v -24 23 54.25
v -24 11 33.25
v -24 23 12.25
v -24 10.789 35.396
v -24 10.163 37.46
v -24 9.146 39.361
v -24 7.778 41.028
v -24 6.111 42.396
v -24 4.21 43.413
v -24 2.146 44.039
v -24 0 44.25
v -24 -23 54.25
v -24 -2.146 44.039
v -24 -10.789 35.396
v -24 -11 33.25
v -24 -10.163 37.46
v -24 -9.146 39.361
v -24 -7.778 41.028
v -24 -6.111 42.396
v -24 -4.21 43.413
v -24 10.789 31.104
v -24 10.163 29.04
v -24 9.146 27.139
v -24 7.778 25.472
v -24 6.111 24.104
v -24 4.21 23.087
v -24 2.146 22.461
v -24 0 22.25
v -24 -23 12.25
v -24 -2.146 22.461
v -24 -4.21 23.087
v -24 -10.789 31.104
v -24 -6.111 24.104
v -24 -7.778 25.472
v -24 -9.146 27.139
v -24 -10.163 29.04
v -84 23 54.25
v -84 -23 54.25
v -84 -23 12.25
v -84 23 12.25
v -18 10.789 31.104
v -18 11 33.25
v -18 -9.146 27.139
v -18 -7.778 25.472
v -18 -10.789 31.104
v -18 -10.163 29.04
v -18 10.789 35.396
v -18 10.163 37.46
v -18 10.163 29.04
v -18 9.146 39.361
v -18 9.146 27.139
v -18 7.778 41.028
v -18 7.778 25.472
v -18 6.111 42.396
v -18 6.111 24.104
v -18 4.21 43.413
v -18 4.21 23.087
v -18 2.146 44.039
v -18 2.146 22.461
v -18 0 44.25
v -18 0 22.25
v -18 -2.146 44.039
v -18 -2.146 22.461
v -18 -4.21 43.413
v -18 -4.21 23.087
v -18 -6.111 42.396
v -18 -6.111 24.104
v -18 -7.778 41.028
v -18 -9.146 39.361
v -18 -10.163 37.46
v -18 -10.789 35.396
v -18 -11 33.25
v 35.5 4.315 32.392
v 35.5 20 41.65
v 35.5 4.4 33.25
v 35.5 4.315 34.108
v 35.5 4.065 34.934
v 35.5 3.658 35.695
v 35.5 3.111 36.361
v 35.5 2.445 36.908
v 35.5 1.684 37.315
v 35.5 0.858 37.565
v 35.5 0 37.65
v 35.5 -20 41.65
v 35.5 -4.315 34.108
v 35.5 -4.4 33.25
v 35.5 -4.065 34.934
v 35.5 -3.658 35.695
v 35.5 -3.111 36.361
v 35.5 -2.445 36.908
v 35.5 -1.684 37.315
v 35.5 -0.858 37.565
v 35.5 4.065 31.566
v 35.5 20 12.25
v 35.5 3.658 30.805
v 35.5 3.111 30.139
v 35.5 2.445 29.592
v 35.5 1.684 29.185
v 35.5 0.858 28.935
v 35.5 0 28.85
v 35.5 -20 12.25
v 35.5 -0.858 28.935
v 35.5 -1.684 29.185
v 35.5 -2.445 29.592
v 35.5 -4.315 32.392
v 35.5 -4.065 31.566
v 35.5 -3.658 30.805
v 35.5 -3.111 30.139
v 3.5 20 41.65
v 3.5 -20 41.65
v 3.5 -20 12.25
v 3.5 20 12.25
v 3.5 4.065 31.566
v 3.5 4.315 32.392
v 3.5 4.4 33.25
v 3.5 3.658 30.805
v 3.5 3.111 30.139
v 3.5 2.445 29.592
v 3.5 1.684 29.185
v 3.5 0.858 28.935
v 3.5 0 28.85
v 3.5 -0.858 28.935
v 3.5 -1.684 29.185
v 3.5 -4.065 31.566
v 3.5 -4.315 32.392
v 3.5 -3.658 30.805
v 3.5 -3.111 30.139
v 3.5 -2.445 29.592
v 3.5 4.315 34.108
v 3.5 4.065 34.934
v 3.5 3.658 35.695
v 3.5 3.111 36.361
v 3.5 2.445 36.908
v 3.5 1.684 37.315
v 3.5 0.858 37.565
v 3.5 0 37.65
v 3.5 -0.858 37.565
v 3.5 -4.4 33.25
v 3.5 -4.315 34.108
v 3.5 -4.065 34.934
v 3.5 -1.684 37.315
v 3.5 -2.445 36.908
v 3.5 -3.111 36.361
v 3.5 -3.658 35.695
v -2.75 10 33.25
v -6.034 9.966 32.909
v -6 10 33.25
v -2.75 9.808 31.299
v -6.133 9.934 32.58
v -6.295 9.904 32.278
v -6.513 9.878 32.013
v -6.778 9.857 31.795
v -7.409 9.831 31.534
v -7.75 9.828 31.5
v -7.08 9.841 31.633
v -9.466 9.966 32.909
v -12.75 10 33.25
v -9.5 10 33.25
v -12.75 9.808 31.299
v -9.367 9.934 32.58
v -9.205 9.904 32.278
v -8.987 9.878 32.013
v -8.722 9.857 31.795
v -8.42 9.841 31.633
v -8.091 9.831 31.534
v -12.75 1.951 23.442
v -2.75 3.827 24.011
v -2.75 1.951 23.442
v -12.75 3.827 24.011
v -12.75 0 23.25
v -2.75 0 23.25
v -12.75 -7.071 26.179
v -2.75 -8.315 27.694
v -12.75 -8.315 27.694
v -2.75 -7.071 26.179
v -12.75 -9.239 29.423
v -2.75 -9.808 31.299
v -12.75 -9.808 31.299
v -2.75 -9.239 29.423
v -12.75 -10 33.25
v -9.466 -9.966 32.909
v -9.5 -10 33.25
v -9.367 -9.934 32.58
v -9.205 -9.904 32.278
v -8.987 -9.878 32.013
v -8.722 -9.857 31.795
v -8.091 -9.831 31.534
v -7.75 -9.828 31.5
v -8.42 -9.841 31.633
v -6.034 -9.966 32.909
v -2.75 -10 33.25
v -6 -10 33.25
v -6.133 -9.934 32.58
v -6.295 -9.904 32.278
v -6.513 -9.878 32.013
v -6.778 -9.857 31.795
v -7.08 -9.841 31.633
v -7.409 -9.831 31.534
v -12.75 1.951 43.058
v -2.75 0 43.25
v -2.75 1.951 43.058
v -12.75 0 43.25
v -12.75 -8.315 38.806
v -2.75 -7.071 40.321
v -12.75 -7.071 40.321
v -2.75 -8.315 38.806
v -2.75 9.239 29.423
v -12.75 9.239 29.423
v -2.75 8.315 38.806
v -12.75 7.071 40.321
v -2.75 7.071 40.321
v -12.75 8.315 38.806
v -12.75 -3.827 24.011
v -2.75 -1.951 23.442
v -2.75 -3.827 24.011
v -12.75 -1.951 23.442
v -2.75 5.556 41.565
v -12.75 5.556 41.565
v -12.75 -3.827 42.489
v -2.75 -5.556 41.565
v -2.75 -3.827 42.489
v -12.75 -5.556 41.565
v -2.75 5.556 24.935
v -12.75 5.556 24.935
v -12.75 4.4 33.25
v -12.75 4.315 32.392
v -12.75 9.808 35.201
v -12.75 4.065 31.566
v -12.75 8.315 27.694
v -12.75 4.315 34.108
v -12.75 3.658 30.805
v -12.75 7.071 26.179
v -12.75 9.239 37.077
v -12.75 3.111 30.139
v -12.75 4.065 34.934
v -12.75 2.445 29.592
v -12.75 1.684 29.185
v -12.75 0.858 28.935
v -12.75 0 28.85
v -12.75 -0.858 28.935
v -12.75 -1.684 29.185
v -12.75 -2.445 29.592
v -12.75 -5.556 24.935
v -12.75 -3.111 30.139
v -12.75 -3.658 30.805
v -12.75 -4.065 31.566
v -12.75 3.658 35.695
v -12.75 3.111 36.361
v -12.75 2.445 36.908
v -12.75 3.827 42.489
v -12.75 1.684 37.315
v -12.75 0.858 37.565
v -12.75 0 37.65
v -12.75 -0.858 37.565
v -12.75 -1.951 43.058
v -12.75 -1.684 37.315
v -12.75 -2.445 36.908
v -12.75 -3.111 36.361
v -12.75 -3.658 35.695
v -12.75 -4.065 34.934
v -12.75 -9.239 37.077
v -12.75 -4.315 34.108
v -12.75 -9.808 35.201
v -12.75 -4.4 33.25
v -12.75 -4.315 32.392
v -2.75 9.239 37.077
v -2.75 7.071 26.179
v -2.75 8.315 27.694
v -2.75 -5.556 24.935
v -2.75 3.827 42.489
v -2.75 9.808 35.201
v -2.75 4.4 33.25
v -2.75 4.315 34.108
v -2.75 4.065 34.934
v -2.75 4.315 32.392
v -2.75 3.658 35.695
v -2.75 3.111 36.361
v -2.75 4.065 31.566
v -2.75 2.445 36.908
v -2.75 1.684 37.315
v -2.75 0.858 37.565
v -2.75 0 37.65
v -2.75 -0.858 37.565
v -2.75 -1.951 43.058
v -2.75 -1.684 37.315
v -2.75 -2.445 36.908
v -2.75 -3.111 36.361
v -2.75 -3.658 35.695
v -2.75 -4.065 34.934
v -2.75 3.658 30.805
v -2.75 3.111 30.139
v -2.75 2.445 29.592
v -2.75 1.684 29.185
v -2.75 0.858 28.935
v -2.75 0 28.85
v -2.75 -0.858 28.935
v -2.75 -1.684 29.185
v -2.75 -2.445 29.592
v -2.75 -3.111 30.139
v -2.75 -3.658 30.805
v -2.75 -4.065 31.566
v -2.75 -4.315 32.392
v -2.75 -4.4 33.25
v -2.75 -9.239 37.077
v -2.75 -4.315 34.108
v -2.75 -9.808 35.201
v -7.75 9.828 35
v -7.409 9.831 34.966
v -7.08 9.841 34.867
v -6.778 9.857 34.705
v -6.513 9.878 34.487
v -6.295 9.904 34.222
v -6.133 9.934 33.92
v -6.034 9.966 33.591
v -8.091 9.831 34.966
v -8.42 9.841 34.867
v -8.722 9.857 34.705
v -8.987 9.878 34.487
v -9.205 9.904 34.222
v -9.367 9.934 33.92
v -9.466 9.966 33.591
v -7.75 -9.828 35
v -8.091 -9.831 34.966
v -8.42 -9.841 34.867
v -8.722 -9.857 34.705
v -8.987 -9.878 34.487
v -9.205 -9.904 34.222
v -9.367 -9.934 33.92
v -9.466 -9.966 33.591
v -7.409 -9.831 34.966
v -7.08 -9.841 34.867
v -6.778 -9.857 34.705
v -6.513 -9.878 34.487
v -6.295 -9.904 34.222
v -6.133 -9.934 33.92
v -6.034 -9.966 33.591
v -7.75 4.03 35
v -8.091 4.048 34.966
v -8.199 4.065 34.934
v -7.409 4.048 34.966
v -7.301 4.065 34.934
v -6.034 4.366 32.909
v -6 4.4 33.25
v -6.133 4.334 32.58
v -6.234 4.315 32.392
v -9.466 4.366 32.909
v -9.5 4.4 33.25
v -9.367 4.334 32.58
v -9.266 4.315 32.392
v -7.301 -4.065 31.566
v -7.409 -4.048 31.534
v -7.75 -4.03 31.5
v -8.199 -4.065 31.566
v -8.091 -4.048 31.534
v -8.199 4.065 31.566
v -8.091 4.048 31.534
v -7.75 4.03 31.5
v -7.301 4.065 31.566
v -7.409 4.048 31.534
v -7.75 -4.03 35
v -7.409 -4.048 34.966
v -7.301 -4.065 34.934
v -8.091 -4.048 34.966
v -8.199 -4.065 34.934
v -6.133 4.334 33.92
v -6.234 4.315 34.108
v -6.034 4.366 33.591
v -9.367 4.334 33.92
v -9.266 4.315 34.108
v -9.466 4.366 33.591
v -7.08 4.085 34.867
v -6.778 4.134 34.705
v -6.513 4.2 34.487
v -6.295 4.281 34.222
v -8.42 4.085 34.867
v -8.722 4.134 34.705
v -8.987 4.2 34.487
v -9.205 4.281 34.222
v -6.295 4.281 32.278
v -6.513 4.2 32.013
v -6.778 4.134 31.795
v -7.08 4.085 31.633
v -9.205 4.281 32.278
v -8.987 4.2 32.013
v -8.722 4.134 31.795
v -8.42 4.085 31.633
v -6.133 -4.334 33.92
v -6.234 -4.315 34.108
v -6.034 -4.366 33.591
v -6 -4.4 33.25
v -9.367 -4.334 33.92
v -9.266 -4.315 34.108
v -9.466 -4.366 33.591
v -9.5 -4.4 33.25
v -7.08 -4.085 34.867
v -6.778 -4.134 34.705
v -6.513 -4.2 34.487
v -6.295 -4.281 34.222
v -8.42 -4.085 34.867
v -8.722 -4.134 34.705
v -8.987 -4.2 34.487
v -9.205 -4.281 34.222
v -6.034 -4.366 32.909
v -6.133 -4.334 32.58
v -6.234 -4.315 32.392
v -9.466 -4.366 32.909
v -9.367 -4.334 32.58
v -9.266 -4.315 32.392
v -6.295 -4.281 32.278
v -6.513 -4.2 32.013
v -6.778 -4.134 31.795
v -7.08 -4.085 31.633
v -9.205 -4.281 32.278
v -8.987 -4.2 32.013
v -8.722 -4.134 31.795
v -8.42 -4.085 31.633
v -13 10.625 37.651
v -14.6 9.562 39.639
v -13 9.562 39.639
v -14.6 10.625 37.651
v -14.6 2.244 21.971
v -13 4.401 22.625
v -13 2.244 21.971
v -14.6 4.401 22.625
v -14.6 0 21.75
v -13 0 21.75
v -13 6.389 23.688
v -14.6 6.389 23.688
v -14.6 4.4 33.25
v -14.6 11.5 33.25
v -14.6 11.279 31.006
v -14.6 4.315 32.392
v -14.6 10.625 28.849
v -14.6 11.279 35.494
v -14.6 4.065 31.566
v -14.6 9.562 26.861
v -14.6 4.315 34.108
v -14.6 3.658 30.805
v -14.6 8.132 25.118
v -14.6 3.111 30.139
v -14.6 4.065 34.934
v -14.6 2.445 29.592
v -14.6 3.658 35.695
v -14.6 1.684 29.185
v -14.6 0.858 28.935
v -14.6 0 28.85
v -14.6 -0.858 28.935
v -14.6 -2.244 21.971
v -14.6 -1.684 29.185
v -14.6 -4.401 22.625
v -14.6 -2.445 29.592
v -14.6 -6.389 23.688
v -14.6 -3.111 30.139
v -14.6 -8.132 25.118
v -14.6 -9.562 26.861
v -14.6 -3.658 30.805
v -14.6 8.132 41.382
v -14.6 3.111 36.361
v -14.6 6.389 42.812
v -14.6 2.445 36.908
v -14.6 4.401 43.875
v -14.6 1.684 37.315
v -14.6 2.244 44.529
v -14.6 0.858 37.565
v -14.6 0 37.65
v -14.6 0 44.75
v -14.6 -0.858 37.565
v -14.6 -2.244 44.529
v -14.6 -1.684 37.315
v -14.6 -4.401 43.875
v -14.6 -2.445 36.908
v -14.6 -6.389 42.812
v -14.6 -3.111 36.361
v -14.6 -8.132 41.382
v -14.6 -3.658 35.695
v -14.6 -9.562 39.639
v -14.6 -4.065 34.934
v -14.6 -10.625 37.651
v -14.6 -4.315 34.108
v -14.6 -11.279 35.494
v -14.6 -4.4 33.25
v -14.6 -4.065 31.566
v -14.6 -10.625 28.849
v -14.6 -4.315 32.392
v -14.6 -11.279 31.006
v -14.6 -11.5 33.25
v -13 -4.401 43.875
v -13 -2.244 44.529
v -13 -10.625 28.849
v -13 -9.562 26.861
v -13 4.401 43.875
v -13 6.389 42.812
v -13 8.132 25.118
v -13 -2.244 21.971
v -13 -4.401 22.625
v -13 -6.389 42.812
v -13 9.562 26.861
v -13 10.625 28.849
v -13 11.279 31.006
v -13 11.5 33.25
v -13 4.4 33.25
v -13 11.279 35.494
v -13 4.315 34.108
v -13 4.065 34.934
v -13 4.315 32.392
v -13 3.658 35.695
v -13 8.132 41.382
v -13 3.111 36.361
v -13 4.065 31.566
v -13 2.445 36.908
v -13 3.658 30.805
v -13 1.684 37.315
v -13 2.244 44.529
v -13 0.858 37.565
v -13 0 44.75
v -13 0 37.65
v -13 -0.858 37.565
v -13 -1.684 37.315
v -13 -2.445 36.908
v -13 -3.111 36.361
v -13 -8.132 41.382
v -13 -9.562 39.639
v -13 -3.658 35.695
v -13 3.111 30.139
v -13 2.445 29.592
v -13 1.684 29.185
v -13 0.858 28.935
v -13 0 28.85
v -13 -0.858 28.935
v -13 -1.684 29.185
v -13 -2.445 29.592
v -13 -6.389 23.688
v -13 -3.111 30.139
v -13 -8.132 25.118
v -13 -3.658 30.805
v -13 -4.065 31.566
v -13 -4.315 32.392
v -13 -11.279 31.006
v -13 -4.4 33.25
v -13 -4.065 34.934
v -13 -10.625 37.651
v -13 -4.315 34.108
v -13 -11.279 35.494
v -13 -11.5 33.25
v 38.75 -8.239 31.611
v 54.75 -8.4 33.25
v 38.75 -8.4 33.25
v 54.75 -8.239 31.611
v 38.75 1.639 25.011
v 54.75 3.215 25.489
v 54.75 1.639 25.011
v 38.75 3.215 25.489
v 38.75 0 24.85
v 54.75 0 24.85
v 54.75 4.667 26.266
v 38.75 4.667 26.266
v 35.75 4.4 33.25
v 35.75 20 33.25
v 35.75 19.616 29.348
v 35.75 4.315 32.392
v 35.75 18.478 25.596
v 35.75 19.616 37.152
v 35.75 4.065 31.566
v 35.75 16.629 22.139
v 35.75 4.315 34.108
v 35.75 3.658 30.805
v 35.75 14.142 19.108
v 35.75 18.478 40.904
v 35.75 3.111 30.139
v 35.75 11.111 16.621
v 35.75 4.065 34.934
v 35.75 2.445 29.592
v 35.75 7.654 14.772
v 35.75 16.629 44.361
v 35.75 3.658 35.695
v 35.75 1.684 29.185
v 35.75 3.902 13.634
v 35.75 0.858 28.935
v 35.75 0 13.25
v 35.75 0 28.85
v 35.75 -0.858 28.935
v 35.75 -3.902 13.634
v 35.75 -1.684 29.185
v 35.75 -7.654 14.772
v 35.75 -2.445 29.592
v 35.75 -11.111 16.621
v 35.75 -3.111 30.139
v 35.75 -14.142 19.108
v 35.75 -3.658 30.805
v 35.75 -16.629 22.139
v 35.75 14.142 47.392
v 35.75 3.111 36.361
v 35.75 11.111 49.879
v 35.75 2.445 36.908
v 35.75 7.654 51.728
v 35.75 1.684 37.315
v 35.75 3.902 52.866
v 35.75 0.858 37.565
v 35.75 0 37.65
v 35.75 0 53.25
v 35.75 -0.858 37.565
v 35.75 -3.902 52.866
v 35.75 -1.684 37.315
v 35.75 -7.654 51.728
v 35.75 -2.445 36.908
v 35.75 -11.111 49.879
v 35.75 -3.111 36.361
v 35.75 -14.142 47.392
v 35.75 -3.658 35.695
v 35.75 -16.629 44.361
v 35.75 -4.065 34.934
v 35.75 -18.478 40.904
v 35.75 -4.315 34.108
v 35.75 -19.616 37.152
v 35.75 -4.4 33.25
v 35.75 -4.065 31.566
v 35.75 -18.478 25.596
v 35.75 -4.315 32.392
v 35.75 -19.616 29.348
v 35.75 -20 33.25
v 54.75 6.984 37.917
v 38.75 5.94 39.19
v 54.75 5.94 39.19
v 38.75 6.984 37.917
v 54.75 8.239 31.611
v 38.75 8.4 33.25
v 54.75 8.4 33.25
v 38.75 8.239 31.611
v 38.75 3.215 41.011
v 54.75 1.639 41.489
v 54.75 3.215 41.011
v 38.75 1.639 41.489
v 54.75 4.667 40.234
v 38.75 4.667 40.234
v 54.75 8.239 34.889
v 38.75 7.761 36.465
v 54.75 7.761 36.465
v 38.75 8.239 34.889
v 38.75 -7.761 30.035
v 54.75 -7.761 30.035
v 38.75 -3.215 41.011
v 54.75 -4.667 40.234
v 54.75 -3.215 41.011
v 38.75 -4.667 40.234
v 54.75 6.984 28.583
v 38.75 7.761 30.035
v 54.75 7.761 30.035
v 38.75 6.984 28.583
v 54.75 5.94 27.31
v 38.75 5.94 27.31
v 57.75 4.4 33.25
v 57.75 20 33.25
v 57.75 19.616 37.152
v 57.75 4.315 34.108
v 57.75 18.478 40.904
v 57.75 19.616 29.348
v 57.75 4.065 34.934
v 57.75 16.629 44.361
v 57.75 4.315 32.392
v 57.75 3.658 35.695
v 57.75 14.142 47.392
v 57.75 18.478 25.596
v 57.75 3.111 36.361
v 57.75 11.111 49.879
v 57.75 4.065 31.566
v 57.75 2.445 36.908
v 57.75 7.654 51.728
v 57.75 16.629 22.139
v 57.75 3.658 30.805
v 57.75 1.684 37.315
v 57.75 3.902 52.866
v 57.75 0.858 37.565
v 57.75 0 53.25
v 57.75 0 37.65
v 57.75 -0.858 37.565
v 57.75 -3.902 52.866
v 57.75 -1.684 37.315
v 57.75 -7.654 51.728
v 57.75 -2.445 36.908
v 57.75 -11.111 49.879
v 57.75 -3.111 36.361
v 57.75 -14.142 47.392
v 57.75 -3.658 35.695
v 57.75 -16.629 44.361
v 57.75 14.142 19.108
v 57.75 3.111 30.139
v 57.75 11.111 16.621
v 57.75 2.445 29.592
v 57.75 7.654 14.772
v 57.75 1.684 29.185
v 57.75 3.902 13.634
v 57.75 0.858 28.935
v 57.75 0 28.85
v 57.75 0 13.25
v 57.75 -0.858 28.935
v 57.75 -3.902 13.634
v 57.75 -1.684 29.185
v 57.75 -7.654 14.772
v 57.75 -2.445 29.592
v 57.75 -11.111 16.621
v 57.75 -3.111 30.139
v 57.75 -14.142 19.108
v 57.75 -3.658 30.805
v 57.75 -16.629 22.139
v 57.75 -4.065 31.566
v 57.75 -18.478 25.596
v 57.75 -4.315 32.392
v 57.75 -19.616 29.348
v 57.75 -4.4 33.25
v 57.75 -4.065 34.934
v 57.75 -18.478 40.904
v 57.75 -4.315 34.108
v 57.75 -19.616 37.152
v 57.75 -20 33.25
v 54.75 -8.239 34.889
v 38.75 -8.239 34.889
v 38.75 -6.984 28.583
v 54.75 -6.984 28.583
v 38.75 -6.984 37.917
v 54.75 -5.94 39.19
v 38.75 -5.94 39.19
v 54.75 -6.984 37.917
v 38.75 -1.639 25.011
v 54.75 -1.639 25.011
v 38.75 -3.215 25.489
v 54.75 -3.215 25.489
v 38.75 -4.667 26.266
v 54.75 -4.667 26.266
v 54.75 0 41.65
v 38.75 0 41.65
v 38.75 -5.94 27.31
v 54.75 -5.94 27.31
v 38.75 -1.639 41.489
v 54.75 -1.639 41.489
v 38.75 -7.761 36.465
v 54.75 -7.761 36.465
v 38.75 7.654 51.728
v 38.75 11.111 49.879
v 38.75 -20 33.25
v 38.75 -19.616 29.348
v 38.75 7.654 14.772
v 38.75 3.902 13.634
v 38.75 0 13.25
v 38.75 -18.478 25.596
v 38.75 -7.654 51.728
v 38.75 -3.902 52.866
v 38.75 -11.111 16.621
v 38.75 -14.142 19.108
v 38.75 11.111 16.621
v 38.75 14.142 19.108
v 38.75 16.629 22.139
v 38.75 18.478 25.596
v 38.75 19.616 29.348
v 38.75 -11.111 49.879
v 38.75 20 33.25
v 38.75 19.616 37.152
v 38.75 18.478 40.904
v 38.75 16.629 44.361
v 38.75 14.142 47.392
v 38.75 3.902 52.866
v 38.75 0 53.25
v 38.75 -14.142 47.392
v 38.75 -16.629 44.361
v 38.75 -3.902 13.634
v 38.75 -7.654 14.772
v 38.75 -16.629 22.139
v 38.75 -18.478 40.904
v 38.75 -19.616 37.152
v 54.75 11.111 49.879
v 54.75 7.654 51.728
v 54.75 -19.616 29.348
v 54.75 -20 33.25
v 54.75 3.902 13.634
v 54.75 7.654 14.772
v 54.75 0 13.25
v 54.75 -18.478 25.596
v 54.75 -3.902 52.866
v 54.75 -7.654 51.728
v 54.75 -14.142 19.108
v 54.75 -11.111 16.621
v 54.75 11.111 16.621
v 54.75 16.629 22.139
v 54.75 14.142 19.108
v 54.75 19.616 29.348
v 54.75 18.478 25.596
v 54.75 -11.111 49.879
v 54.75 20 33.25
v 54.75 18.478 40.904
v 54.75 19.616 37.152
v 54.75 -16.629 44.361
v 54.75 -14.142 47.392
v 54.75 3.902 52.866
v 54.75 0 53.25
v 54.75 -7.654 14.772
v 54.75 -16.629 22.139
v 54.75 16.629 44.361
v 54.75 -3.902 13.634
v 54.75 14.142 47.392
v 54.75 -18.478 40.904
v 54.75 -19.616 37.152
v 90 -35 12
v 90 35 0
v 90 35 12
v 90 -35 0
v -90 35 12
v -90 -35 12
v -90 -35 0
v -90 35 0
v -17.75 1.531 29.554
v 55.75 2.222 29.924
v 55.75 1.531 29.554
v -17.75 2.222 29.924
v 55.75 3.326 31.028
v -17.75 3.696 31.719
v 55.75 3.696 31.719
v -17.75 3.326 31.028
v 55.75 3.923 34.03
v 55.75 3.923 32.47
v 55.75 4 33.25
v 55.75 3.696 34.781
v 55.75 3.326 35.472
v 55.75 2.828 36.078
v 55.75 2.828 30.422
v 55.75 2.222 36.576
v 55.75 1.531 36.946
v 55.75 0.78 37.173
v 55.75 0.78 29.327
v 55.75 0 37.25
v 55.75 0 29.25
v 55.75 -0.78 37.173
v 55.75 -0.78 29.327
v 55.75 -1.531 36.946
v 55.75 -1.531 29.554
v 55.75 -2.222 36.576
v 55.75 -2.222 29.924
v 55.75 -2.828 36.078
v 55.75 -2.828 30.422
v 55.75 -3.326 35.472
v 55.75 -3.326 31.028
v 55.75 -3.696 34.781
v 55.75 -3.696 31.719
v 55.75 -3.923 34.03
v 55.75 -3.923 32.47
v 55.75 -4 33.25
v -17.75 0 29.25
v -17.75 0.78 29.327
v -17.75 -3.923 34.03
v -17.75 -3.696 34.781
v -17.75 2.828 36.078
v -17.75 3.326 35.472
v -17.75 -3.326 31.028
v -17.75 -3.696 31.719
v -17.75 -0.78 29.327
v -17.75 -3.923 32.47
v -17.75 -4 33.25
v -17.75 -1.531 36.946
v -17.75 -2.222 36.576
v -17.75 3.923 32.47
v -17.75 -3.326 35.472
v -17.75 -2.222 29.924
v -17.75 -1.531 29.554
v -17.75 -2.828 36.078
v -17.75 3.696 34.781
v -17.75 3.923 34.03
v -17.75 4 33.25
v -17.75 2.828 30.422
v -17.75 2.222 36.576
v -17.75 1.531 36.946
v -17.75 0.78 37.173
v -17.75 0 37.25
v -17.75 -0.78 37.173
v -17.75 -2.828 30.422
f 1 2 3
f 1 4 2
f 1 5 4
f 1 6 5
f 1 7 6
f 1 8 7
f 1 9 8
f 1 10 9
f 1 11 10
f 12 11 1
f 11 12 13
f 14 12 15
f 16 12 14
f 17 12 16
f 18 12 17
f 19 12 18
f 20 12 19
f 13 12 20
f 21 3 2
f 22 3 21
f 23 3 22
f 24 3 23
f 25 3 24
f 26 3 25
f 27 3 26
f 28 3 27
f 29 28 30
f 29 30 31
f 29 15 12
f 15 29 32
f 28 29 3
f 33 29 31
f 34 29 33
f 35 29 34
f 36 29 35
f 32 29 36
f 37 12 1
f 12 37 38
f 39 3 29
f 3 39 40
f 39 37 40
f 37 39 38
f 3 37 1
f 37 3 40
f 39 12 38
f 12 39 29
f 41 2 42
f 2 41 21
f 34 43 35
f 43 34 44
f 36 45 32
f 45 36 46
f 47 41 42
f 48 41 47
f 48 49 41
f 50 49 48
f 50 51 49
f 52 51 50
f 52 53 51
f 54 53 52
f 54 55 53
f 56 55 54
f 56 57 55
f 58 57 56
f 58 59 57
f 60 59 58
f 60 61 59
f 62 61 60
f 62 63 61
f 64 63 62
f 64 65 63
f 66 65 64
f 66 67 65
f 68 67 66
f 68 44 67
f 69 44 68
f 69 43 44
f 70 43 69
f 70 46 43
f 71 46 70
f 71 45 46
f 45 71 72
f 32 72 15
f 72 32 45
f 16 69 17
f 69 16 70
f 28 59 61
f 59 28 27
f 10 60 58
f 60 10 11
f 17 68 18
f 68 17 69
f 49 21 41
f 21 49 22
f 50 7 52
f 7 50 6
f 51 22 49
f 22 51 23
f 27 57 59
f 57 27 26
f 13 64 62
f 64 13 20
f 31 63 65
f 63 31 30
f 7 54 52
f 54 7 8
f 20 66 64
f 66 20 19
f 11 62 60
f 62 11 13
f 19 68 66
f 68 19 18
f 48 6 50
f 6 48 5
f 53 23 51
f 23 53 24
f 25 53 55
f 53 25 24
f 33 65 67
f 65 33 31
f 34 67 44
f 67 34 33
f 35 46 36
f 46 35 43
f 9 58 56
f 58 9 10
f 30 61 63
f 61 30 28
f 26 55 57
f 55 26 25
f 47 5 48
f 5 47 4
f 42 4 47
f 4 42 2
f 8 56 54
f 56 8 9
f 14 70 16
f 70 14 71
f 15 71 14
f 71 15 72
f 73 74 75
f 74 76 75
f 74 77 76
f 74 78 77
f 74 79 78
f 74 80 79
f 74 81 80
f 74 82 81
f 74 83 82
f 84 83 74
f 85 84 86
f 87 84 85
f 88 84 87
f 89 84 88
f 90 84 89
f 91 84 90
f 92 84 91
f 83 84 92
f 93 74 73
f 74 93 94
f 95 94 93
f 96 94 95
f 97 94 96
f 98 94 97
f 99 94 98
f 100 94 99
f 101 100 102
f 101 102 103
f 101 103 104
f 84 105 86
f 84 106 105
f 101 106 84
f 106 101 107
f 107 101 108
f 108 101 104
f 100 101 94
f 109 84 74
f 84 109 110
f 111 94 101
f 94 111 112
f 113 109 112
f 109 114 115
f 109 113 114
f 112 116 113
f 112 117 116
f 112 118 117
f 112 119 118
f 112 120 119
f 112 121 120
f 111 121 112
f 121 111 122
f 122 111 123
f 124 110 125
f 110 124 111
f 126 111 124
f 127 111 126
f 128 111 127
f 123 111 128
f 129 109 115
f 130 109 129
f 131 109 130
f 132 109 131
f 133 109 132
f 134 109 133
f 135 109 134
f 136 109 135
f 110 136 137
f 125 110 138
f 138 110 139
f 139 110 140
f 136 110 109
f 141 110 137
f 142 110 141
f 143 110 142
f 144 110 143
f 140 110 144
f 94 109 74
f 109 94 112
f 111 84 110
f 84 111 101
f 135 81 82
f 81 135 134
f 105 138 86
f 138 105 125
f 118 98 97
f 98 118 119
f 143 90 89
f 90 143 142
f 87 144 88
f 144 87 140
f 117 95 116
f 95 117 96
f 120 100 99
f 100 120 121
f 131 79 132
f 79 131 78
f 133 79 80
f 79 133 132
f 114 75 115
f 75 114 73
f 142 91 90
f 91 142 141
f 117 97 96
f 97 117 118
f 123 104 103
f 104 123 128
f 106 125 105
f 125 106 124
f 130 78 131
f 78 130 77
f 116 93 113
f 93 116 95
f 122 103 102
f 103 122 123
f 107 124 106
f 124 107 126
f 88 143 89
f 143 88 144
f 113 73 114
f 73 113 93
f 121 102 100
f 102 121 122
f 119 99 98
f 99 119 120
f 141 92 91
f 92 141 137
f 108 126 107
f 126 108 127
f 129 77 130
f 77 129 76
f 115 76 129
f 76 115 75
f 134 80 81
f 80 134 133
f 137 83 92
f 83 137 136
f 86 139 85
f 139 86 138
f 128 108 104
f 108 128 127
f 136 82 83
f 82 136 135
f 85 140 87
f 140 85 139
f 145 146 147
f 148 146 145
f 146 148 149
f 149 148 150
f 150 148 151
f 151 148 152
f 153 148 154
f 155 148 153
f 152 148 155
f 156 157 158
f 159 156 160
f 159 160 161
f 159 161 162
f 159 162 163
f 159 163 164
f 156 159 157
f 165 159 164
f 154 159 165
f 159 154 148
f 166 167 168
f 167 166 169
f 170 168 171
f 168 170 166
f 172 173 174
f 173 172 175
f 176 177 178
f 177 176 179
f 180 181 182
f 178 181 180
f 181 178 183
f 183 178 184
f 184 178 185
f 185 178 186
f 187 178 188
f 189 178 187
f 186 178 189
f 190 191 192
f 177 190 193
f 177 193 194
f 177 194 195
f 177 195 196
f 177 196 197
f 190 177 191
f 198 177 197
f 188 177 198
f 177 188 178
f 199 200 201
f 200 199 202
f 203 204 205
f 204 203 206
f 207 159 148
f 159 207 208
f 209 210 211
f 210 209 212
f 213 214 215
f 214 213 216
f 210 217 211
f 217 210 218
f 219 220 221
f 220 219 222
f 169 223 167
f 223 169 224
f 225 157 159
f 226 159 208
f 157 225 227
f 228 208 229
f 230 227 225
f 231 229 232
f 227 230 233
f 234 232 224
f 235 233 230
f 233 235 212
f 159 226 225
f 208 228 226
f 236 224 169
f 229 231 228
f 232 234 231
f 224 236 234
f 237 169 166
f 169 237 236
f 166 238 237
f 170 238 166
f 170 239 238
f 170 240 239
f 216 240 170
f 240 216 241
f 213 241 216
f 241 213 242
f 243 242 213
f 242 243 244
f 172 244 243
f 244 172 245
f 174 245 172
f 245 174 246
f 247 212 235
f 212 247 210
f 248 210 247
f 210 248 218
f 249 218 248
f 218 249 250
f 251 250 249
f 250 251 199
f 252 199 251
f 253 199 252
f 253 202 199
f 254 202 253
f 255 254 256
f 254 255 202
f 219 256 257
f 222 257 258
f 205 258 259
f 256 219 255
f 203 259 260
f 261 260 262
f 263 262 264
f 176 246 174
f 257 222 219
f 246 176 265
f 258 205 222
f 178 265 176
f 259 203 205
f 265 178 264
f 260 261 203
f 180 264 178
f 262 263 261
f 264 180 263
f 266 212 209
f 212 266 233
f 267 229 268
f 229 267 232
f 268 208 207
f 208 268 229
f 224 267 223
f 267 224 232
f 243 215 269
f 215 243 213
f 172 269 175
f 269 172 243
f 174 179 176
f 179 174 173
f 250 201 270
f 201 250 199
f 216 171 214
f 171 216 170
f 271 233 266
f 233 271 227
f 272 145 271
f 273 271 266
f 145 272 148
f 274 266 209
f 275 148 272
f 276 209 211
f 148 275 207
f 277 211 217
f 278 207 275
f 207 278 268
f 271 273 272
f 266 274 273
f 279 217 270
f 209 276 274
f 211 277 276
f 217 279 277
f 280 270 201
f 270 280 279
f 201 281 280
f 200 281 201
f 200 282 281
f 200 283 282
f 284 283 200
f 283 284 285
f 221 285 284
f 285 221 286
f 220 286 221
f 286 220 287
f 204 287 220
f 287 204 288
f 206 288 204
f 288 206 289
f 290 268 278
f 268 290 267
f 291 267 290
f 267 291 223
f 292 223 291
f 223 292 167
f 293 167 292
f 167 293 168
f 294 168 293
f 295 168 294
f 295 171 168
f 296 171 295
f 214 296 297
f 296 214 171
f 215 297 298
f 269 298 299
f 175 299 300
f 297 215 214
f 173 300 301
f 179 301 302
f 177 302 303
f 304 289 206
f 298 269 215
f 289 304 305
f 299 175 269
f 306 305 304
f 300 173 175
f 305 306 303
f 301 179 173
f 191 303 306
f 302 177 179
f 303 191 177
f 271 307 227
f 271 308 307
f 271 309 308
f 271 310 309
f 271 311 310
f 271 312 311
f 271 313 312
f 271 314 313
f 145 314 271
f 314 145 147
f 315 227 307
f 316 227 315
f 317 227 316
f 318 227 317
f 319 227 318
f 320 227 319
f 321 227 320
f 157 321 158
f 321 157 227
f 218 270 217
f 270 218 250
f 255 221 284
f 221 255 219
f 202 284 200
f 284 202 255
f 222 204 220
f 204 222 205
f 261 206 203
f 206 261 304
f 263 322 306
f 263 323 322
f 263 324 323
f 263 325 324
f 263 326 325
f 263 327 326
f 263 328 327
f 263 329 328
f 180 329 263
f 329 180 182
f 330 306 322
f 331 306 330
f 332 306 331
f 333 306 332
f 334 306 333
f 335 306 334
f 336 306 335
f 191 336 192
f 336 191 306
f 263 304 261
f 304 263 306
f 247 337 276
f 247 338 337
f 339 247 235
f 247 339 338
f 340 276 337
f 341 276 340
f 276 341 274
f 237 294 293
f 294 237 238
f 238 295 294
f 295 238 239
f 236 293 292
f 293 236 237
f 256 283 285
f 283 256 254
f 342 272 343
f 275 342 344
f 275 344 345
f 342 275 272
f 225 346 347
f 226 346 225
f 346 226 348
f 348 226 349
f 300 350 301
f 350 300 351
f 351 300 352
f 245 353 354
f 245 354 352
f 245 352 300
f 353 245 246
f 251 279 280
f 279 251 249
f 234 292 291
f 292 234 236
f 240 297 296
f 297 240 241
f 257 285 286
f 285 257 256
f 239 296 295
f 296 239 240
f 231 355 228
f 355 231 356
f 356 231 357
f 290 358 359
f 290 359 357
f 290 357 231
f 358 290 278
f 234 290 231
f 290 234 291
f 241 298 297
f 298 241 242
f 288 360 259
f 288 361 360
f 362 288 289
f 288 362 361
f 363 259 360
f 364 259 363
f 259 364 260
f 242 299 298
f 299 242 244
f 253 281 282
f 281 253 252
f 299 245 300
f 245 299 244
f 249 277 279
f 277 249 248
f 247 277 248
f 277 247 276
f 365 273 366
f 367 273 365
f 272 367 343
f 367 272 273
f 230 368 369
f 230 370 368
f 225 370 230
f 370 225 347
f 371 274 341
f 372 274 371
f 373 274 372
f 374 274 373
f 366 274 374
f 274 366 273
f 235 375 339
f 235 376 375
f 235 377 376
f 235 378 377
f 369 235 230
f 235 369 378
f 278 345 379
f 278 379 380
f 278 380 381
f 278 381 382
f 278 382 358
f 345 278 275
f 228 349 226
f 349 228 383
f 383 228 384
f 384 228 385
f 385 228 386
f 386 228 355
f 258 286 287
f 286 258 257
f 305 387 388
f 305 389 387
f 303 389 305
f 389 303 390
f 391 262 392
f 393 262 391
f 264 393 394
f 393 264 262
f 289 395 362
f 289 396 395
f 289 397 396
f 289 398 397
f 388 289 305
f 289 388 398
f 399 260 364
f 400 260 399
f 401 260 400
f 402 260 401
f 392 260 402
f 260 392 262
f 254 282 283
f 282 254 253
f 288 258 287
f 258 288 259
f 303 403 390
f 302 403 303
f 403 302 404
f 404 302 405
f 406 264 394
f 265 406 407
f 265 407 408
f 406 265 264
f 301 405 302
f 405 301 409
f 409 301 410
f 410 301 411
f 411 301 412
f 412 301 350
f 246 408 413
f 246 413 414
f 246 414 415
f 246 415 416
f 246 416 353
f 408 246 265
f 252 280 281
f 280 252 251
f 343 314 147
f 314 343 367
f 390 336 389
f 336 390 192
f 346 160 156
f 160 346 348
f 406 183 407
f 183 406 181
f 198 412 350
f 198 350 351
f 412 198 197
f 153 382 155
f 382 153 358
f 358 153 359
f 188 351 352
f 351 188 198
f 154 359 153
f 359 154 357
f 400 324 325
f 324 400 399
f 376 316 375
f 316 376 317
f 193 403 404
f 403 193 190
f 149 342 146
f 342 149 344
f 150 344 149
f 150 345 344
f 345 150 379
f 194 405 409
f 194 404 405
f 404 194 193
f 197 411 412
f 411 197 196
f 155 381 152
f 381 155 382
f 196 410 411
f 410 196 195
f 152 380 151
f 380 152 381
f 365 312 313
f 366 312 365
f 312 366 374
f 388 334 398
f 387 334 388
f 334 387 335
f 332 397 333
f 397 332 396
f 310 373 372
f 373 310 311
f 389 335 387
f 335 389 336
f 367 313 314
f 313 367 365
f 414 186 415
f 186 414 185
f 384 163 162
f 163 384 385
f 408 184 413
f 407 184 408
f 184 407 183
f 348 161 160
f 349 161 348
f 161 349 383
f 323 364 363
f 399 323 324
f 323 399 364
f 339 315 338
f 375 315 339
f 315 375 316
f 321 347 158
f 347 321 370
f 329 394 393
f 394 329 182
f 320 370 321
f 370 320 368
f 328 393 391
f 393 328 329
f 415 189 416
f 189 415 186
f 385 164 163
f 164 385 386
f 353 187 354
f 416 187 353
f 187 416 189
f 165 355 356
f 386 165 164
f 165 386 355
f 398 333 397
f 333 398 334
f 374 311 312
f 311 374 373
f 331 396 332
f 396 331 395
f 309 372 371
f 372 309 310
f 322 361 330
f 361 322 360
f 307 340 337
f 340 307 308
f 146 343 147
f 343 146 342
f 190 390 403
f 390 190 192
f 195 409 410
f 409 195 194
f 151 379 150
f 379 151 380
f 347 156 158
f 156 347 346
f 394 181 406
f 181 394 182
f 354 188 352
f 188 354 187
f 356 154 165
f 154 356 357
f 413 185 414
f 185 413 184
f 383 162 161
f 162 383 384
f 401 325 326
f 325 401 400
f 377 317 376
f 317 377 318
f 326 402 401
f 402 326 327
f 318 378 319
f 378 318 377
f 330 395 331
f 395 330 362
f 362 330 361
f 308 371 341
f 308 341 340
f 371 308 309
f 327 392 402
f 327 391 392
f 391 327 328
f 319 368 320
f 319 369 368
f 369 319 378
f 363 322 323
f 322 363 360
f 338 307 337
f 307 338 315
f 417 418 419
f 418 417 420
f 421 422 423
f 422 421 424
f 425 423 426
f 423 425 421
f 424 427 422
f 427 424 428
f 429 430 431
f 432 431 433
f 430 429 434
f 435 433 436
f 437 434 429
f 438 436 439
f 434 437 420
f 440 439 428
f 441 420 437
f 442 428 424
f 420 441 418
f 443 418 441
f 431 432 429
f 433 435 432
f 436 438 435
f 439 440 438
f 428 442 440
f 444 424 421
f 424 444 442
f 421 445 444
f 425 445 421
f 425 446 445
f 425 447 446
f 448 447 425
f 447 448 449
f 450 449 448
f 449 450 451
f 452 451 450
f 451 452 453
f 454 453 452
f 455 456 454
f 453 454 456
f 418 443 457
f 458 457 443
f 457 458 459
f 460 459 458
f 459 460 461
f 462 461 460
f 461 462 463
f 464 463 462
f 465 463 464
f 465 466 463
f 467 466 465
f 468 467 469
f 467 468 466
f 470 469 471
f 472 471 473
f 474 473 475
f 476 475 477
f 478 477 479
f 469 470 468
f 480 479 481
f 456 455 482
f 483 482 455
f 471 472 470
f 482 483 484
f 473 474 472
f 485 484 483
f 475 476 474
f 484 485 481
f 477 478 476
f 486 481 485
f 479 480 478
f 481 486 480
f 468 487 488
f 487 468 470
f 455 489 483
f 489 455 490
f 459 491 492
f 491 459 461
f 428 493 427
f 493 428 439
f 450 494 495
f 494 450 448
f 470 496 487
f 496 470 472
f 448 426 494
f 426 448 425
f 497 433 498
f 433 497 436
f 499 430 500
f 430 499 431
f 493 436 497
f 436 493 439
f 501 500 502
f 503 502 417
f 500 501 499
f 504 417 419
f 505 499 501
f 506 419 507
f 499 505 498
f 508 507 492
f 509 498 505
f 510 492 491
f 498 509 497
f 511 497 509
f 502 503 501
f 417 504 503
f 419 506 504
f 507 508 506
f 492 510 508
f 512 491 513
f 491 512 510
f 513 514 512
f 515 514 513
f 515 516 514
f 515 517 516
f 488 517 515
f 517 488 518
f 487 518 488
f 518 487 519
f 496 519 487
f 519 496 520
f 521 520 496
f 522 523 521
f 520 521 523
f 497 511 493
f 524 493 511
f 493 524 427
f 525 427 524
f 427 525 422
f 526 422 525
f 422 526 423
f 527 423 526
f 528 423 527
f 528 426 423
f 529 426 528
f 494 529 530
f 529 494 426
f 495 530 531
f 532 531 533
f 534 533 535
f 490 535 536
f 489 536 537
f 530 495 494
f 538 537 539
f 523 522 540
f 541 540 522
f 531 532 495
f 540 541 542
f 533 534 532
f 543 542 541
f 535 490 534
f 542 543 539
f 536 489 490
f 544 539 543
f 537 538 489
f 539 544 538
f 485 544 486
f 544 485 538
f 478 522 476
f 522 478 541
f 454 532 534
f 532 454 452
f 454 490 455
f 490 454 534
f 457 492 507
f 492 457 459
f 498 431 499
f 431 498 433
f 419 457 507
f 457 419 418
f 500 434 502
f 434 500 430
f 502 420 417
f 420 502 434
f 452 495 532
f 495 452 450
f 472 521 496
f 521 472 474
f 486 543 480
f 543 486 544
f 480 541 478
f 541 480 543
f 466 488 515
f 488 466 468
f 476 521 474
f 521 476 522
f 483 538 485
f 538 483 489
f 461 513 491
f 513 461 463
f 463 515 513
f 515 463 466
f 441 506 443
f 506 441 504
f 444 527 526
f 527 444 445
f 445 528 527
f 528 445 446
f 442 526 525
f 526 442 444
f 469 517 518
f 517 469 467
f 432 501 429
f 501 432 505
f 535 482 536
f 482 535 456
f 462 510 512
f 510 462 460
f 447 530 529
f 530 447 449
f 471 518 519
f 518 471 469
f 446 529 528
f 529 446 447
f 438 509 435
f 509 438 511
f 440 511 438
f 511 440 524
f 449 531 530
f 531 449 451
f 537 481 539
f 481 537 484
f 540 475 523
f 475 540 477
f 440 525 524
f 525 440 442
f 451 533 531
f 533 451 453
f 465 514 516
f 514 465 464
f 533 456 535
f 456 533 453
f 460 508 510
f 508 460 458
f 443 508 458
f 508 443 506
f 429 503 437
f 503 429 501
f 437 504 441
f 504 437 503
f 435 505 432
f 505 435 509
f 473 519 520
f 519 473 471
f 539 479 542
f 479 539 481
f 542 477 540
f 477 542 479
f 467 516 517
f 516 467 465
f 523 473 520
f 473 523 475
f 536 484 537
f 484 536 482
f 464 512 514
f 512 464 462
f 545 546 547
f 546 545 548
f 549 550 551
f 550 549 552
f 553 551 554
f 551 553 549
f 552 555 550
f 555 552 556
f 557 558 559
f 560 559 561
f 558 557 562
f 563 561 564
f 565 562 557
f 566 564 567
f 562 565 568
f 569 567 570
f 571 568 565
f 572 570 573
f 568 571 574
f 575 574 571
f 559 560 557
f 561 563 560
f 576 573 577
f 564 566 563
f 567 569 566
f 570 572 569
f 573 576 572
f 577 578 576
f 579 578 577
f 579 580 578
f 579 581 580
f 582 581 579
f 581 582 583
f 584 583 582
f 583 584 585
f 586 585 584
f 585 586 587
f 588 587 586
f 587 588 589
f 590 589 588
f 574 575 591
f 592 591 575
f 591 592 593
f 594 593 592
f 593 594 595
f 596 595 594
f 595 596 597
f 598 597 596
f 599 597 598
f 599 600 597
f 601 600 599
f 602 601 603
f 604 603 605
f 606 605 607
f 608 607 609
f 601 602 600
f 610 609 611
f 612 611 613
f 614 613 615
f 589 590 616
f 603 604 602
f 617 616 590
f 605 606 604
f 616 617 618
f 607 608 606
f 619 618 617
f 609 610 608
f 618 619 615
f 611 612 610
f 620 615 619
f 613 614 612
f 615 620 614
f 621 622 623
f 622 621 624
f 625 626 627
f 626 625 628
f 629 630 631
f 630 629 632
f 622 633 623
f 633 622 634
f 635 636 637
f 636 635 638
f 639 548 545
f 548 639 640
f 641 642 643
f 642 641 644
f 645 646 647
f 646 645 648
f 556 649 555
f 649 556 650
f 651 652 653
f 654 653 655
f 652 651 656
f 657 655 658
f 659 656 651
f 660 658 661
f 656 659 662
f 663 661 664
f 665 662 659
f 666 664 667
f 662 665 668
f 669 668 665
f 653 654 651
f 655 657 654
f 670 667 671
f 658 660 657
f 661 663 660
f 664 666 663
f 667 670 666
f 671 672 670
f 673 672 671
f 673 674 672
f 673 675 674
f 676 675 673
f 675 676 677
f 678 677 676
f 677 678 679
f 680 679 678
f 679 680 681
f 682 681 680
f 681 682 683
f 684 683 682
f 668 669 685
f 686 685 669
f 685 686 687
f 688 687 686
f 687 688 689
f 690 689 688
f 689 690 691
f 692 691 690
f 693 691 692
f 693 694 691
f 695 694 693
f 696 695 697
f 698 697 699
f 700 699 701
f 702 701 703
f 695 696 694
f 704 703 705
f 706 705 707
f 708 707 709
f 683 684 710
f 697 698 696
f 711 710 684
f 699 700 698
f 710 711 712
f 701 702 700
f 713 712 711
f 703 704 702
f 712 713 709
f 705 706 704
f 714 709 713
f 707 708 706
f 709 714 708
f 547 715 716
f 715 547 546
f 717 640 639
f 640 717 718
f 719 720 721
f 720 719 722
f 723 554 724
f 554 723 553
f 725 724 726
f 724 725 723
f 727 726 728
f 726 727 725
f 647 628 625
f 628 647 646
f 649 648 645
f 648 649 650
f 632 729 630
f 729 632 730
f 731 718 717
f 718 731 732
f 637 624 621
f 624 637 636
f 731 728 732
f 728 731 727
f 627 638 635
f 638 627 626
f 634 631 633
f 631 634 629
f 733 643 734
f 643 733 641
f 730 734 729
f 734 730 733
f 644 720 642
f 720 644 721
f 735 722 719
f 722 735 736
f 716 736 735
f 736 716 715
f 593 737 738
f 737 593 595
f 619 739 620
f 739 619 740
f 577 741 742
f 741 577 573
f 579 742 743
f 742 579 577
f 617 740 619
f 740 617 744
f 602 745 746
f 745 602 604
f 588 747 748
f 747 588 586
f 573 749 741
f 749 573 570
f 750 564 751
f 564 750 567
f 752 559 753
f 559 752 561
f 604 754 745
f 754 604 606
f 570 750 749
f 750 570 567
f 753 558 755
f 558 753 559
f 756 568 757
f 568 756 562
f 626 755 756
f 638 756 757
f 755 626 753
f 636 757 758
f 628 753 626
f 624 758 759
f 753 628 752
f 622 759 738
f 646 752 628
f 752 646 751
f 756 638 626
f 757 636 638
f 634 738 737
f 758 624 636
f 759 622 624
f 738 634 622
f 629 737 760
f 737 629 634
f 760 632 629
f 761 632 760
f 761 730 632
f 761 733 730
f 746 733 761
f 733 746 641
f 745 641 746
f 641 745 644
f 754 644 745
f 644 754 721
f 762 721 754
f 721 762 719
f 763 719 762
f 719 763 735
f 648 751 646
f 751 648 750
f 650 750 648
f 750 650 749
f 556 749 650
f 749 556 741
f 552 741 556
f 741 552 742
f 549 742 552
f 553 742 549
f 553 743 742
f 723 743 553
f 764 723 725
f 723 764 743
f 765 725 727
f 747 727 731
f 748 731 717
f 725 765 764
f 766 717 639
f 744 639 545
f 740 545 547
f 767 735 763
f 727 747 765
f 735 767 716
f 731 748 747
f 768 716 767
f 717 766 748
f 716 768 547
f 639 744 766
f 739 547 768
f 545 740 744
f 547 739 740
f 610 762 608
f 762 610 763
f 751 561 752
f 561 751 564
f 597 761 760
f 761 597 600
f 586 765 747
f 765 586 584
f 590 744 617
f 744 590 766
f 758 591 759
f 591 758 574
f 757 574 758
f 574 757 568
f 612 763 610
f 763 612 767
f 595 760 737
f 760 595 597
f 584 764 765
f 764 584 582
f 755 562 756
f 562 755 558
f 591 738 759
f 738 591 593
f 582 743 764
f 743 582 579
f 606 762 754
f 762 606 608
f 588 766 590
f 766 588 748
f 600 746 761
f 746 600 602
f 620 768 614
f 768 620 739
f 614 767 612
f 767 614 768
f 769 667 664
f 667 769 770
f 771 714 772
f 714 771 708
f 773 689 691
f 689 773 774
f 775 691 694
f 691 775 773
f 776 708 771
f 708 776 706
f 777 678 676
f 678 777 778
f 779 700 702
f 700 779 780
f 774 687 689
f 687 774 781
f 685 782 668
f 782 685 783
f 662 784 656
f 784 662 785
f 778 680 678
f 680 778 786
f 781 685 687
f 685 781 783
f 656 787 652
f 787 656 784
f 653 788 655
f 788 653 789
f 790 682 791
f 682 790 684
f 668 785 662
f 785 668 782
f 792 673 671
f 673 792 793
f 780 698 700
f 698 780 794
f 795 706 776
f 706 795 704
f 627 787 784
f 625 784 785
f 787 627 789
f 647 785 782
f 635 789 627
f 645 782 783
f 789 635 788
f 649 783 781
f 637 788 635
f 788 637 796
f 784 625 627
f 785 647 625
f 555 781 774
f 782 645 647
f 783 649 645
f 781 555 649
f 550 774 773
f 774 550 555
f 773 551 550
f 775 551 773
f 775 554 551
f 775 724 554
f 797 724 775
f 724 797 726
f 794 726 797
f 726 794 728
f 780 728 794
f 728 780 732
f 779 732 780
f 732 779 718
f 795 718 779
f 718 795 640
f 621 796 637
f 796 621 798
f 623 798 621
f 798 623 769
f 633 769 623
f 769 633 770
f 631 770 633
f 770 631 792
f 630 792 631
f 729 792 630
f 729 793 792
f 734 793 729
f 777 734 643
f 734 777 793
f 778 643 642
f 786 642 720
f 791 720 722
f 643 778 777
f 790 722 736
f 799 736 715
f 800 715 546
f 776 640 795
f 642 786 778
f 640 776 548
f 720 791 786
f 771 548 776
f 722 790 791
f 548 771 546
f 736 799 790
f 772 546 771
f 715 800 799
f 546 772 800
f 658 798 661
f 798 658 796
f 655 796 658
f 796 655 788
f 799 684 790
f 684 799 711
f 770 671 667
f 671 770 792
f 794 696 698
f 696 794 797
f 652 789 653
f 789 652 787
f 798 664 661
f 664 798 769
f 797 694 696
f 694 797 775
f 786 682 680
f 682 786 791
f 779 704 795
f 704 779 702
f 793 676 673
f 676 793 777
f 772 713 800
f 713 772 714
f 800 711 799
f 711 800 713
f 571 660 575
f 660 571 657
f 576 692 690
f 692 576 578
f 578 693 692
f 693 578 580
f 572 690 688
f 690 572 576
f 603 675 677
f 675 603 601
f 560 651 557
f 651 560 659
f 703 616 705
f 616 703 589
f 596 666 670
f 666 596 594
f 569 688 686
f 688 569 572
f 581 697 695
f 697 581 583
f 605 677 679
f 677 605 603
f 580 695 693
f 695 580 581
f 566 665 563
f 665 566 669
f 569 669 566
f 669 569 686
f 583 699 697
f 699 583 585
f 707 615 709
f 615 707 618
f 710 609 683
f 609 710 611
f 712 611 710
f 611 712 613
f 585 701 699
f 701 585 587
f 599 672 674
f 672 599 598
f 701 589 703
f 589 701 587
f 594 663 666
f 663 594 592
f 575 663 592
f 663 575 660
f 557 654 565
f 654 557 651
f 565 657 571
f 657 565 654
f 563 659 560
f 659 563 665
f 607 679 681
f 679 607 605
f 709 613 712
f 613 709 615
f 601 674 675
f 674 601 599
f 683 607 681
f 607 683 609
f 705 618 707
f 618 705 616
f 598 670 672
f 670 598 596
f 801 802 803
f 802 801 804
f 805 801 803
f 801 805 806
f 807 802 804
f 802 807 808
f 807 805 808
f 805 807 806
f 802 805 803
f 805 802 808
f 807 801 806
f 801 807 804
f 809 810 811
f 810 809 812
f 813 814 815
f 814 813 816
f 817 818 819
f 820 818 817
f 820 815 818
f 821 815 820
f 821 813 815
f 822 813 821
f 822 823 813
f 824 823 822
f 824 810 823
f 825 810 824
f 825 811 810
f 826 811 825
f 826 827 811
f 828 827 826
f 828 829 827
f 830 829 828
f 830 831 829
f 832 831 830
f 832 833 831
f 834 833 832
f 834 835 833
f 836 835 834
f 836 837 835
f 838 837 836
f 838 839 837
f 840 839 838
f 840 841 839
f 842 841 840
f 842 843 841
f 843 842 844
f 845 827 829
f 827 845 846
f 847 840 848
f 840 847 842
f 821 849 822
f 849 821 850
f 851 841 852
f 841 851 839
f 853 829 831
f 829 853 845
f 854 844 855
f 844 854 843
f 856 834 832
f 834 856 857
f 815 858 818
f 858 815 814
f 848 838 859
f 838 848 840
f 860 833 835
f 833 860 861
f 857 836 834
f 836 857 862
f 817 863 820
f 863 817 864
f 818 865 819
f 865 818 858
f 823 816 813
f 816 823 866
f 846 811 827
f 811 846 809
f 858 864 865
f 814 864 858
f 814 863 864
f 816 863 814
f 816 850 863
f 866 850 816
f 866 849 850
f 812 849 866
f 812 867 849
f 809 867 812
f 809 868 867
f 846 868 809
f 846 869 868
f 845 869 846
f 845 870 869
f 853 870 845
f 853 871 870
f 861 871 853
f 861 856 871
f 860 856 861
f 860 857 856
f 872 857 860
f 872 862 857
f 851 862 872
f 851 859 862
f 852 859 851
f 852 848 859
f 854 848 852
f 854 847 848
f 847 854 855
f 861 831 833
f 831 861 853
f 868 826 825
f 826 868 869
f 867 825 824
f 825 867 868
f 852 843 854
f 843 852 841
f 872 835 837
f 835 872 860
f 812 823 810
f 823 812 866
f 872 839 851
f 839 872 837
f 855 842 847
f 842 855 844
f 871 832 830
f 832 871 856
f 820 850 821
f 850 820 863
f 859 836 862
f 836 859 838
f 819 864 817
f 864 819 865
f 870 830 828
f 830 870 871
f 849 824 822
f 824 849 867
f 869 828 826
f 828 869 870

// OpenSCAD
$fn = 32;

// ------------------------------------------------------------------------
// Motor drive station: motor 60 x 42 mm, shaft d8, pulley d40
// Every part is its own module, assembly() places every instance.
// ------------------------------------------------------------------------

// --- part 1 ---
module station_bed() {
  difference() {
    translate([-90, -35, 0]) cube([180, 70, 12]);
  }
}

// --- part 2 ---
module drive_motor() {
  union() {
    translate([-30, -23, 0]) cube([60, 46, 42]);
    translate([33, 0, 21]) rotate([0, 90, 0]) cylinder(h = 6, d = 22, center = true);
  }
}

// --- part 3 ---
module pillow_block() {
  difference() {
    translate([-16, -20, 0]) cube([32, 40, 29.4]);
    translate([0, 0, 21]) rotate([0, 90, 0]) cylinder(h = 34, d = 8.8, center = true);
  }
}

// --- part 4 ---
module drive_shaft() {
  translate([0, 0, -36.75]) cylinder(h = 73.5, d = 8);
}

// --- part 5 ---
module shaft_collar() {
  difference() {
    cylinder(h = 10, d = 20);
    translate([0, 0, -1]) cylinder(h = 12, d = 8.8);
    translate([0, 0, 5]) rotate([90, 0, 0]) cylinder(h = 22, d = 3.5, center = true);
  }
}

// --- part 6 ---
module collar_washer() {
  difference() {
      translate([0, 0, 0]) cylinder(h = 1.6, d = 23);
      translate([0, 0, -1]) cylinder(h = 3.6, d = 8.8);
    }
}

// --- part 7 ---
module drive_pulley() {
  difference() {
    union() {
      cylinder(h = 22, d = 16.8);
      cylinder(h = 3, d = 40);
      translate([0, 0, 19]) cylinder(h = 3, d = 40);
    }
    translate([0, 0, -1]) cylinder(h = 24, d = 8.8);
  }
}

// --- assembly ---
module assembly() {
  color([0.80, 0.24, 0.20]) translate([0, 0, 0]) rotate([0, 0, 0]) station_bed();
  color([0.20, 0.45, 0.75]) translate([-54, 0, 12.25]) rotate([0, 0, 0]) drive_motor();
  color([0.25, 0.62, 0.32]) translate([19.5, 0, 12.25]) rotate([0, 0, 0]) pillow_block();
  color([0.92, 0.70, 0.18]) translate([19, 0, 33.25]) rotate([0, 90, 0]) drive_shaft();
  color([0.58, 0.35, 0.70]) translate([-12.75, 0, 33.25]) rotate([0, 90, 0]) shaft_collar();
  color([0.16, 0.66, 0.66]) translate([-14.6, 0, 33.25]) rotate([0, 90, 0]) collar_washer();
  color([0.85, 0.48, 0.18]) translate([35.75, 0, 33.25]) rotate([0, 90, 0]) drive_pulley();
}

assembly();
